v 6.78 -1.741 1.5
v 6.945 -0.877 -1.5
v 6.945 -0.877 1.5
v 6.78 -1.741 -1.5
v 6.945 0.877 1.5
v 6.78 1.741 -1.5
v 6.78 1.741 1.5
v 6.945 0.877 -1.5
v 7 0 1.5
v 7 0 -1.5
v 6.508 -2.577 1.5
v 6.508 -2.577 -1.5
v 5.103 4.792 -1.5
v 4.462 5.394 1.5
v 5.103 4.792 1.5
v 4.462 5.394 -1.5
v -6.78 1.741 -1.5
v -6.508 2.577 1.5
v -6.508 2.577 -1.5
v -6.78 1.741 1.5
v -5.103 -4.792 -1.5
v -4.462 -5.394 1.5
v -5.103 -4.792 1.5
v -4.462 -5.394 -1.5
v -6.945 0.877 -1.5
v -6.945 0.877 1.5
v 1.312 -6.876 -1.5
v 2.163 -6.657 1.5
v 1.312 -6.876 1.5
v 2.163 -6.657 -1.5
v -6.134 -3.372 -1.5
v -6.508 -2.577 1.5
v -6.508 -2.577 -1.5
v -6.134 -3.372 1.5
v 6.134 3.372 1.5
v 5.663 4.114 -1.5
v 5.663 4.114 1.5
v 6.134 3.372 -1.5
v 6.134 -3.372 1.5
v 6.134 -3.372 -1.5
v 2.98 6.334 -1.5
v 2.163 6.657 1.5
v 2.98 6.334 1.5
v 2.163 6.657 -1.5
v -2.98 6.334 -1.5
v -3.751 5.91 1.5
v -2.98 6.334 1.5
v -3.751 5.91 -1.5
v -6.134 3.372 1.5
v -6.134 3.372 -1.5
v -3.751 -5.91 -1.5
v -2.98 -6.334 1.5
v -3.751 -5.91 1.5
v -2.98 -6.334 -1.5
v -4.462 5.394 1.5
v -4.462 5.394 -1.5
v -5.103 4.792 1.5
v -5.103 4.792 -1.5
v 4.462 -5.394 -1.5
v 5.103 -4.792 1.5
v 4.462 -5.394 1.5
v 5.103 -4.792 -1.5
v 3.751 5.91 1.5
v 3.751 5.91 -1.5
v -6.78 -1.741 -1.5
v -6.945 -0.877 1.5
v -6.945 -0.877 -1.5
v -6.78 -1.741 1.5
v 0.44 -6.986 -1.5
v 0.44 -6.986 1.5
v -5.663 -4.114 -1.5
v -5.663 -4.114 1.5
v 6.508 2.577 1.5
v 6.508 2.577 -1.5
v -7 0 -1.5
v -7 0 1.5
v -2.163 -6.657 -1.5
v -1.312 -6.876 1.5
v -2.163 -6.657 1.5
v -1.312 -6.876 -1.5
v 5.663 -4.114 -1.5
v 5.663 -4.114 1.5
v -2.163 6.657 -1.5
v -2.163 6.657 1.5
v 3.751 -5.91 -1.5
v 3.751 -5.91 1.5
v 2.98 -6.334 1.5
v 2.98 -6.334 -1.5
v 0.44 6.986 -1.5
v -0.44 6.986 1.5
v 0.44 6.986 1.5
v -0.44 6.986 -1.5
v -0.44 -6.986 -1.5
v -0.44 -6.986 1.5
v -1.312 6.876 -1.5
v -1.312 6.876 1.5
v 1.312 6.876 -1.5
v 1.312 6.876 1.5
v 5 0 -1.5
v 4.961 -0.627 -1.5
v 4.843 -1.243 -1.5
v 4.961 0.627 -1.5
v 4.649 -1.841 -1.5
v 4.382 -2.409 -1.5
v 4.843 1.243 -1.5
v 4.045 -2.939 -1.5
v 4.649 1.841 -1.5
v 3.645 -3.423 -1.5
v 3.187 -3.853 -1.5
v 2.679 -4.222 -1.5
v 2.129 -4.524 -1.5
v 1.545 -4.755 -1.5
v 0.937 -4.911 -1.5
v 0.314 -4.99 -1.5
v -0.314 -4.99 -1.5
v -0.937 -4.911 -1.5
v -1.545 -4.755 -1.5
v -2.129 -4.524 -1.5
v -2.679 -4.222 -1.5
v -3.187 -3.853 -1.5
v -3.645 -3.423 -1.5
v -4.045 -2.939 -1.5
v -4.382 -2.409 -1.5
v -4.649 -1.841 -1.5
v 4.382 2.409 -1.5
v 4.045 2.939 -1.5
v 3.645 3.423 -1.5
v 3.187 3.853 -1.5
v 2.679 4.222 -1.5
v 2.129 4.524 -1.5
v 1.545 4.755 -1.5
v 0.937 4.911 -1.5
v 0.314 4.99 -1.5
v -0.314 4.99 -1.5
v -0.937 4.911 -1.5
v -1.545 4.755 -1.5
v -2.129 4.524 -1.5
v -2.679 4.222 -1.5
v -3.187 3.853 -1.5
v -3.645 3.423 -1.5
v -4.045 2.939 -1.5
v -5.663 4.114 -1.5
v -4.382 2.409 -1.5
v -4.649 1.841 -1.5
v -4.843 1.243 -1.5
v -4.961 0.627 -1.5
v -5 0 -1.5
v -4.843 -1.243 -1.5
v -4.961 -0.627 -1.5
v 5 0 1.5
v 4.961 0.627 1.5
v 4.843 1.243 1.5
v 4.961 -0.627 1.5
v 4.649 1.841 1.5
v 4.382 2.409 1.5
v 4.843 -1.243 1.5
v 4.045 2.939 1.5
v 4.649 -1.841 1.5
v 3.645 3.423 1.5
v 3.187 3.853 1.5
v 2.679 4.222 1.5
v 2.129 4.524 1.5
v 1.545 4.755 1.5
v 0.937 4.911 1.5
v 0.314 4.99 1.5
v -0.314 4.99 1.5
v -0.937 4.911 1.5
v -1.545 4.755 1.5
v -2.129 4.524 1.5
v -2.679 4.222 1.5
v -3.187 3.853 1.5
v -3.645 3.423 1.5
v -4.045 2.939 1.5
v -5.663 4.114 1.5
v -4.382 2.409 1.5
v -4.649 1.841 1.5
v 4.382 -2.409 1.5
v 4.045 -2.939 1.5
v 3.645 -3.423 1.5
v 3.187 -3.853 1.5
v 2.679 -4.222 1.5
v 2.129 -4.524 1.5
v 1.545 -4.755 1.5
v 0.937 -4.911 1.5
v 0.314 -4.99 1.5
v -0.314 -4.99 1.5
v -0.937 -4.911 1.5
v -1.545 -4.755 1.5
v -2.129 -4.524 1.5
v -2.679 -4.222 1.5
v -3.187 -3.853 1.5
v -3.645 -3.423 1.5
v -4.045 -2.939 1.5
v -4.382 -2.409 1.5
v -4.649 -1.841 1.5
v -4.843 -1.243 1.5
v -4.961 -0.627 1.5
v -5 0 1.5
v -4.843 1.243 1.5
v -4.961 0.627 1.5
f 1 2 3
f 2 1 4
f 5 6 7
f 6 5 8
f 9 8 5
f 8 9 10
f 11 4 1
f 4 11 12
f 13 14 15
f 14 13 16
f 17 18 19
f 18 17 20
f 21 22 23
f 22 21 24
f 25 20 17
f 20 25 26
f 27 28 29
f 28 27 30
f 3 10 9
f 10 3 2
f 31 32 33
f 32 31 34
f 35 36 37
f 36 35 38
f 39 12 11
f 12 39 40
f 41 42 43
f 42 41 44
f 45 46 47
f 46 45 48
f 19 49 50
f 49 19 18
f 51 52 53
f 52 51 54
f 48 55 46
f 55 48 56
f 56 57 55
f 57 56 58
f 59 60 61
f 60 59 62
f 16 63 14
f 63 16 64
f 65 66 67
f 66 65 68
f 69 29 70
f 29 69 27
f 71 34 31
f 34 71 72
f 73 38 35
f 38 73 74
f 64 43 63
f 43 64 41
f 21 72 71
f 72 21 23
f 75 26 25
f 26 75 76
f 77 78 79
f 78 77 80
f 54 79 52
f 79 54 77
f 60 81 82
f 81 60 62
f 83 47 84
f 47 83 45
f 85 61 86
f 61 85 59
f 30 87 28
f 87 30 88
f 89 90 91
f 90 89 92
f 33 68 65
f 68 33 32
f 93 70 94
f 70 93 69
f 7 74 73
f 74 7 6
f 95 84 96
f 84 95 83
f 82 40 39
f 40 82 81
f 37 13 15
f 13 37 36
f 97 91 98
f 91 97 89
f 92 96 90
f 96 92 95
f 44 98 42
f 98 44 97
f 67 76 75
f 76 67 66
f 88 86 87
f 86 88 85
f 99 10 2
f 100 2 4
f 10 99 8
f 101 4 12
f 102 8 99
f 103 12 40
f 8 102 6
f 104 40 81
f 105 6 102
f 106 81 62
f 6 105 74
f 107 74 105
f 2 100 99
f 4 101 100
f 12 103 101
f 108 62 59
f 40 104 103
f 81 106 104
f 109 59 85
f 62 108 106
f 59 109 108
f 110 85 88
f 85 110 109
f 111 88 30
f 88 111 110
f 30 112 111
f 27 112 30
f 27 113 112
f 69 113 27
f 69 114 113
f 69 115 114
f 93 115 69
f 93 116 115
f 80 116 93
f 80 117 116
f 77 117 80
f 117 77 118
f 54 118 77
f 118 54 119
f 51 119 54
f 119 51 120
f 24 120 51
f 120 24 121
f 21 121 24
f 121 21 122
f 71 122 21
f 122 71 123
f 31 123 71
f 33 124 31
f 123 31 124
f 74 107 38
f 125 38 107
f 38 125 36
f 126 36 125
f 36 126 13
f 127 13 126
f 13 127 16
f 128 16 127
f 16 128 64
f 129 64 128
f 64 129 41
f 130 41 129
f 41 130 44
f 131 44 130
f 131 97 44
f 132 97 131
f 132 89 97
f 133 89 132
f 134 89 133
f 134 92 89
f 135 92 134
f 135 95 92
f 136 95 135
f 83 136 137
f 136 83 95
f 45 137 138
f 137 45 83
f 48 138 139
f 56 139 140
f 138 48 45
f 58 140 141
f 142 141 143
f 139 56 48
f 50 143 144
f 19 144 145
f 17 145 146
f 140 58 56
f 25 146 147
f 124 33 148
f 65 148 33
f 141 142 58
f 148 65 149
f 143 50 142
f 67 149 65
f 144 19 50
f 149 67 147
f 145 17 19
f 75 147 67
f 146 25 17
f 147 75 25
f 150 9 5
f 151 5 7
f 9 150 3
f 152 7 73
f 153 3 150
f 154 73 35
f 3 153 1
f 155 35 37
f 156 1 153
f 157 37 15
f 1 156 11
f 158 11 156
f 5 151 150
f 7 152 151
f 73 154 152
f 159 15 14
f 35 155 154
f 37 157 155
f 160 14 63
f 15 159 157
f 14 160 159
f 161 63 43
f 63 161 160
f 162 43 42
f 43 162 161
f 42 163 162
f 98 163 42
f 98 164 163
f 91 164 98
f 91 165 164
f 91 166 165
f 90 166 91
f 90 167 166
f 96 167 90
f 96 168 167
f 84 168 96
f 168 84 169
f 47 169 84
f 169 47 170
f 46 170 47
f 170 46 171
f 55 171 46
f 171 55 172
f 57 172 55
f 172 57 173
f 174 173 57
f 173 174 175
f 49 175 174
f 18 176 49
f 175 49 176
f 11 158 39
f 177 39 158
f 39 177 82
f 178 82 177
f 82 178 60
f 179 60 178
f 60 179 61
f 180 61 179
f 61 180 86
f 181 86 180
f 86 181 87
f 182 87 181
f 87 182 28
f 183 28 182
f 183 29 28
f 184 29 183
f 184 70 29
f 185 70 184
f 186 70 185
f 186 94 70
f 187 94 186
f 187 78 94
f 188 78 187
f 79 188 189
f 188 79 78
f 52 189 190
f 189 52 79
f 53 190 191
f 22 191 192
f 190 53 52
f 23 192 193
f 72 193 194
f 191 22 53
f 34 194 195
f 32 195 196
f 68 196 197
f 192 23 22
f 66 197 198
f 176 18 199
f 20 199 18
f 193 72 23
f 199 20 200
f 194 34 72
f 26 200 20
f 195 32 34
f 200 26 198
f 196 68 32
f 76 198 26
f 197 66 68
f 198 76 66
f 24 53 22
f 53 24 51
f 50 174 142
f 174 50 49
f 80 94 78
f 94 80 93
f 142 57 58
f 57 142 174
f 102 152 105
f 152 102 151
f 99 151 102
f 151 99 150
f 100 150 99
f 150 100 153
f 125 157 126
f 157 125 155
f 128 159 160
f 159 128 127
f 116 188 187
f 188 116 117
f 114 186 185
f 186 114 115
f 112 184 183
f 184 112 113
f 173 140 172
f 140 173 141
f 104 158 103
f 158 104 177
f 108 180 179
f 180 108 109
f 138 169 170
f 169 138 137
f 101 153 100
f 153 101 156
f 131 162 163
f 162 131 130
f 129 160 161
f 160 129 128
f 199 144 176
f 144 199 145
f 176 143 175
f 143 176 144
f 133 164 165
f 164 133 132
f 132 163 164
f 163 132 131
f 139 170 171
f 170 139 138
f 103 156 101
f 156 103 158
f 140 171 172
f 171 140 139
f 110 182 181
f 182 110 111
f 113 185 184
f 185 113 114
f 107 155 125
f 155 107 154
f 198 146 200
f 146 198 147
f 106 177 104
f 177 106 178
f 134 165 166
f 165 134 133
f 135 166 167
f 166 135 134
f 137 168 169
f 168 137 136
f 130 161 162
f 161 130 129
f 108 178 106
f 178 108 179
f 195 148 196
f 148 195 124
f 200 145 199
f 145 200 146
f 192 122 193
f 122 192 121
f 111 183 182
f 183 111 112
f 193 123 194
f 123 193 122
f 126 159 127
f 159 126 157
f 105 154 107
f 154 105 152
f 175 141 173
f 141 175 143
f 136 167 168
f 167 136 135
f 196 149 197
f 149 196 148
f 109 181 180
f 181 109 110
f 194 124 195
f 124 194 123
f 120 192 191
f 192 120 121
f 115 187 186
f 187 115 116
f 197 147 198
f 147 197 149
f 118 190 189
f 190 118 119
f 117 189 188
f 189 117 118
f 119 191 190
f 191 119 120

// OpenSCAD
$fn = 50;


difference() {
	union() {
		translate(v = [0, 0, -1.5000000000]) {
			cylinder(h = 3, r = 7.0000000000);
		}
	}
	union() {
		translate(v = [0, 0, -100.0000000000]) {
			cylinder(h = 200, r = 5.0000000000);
		}
	}
}
